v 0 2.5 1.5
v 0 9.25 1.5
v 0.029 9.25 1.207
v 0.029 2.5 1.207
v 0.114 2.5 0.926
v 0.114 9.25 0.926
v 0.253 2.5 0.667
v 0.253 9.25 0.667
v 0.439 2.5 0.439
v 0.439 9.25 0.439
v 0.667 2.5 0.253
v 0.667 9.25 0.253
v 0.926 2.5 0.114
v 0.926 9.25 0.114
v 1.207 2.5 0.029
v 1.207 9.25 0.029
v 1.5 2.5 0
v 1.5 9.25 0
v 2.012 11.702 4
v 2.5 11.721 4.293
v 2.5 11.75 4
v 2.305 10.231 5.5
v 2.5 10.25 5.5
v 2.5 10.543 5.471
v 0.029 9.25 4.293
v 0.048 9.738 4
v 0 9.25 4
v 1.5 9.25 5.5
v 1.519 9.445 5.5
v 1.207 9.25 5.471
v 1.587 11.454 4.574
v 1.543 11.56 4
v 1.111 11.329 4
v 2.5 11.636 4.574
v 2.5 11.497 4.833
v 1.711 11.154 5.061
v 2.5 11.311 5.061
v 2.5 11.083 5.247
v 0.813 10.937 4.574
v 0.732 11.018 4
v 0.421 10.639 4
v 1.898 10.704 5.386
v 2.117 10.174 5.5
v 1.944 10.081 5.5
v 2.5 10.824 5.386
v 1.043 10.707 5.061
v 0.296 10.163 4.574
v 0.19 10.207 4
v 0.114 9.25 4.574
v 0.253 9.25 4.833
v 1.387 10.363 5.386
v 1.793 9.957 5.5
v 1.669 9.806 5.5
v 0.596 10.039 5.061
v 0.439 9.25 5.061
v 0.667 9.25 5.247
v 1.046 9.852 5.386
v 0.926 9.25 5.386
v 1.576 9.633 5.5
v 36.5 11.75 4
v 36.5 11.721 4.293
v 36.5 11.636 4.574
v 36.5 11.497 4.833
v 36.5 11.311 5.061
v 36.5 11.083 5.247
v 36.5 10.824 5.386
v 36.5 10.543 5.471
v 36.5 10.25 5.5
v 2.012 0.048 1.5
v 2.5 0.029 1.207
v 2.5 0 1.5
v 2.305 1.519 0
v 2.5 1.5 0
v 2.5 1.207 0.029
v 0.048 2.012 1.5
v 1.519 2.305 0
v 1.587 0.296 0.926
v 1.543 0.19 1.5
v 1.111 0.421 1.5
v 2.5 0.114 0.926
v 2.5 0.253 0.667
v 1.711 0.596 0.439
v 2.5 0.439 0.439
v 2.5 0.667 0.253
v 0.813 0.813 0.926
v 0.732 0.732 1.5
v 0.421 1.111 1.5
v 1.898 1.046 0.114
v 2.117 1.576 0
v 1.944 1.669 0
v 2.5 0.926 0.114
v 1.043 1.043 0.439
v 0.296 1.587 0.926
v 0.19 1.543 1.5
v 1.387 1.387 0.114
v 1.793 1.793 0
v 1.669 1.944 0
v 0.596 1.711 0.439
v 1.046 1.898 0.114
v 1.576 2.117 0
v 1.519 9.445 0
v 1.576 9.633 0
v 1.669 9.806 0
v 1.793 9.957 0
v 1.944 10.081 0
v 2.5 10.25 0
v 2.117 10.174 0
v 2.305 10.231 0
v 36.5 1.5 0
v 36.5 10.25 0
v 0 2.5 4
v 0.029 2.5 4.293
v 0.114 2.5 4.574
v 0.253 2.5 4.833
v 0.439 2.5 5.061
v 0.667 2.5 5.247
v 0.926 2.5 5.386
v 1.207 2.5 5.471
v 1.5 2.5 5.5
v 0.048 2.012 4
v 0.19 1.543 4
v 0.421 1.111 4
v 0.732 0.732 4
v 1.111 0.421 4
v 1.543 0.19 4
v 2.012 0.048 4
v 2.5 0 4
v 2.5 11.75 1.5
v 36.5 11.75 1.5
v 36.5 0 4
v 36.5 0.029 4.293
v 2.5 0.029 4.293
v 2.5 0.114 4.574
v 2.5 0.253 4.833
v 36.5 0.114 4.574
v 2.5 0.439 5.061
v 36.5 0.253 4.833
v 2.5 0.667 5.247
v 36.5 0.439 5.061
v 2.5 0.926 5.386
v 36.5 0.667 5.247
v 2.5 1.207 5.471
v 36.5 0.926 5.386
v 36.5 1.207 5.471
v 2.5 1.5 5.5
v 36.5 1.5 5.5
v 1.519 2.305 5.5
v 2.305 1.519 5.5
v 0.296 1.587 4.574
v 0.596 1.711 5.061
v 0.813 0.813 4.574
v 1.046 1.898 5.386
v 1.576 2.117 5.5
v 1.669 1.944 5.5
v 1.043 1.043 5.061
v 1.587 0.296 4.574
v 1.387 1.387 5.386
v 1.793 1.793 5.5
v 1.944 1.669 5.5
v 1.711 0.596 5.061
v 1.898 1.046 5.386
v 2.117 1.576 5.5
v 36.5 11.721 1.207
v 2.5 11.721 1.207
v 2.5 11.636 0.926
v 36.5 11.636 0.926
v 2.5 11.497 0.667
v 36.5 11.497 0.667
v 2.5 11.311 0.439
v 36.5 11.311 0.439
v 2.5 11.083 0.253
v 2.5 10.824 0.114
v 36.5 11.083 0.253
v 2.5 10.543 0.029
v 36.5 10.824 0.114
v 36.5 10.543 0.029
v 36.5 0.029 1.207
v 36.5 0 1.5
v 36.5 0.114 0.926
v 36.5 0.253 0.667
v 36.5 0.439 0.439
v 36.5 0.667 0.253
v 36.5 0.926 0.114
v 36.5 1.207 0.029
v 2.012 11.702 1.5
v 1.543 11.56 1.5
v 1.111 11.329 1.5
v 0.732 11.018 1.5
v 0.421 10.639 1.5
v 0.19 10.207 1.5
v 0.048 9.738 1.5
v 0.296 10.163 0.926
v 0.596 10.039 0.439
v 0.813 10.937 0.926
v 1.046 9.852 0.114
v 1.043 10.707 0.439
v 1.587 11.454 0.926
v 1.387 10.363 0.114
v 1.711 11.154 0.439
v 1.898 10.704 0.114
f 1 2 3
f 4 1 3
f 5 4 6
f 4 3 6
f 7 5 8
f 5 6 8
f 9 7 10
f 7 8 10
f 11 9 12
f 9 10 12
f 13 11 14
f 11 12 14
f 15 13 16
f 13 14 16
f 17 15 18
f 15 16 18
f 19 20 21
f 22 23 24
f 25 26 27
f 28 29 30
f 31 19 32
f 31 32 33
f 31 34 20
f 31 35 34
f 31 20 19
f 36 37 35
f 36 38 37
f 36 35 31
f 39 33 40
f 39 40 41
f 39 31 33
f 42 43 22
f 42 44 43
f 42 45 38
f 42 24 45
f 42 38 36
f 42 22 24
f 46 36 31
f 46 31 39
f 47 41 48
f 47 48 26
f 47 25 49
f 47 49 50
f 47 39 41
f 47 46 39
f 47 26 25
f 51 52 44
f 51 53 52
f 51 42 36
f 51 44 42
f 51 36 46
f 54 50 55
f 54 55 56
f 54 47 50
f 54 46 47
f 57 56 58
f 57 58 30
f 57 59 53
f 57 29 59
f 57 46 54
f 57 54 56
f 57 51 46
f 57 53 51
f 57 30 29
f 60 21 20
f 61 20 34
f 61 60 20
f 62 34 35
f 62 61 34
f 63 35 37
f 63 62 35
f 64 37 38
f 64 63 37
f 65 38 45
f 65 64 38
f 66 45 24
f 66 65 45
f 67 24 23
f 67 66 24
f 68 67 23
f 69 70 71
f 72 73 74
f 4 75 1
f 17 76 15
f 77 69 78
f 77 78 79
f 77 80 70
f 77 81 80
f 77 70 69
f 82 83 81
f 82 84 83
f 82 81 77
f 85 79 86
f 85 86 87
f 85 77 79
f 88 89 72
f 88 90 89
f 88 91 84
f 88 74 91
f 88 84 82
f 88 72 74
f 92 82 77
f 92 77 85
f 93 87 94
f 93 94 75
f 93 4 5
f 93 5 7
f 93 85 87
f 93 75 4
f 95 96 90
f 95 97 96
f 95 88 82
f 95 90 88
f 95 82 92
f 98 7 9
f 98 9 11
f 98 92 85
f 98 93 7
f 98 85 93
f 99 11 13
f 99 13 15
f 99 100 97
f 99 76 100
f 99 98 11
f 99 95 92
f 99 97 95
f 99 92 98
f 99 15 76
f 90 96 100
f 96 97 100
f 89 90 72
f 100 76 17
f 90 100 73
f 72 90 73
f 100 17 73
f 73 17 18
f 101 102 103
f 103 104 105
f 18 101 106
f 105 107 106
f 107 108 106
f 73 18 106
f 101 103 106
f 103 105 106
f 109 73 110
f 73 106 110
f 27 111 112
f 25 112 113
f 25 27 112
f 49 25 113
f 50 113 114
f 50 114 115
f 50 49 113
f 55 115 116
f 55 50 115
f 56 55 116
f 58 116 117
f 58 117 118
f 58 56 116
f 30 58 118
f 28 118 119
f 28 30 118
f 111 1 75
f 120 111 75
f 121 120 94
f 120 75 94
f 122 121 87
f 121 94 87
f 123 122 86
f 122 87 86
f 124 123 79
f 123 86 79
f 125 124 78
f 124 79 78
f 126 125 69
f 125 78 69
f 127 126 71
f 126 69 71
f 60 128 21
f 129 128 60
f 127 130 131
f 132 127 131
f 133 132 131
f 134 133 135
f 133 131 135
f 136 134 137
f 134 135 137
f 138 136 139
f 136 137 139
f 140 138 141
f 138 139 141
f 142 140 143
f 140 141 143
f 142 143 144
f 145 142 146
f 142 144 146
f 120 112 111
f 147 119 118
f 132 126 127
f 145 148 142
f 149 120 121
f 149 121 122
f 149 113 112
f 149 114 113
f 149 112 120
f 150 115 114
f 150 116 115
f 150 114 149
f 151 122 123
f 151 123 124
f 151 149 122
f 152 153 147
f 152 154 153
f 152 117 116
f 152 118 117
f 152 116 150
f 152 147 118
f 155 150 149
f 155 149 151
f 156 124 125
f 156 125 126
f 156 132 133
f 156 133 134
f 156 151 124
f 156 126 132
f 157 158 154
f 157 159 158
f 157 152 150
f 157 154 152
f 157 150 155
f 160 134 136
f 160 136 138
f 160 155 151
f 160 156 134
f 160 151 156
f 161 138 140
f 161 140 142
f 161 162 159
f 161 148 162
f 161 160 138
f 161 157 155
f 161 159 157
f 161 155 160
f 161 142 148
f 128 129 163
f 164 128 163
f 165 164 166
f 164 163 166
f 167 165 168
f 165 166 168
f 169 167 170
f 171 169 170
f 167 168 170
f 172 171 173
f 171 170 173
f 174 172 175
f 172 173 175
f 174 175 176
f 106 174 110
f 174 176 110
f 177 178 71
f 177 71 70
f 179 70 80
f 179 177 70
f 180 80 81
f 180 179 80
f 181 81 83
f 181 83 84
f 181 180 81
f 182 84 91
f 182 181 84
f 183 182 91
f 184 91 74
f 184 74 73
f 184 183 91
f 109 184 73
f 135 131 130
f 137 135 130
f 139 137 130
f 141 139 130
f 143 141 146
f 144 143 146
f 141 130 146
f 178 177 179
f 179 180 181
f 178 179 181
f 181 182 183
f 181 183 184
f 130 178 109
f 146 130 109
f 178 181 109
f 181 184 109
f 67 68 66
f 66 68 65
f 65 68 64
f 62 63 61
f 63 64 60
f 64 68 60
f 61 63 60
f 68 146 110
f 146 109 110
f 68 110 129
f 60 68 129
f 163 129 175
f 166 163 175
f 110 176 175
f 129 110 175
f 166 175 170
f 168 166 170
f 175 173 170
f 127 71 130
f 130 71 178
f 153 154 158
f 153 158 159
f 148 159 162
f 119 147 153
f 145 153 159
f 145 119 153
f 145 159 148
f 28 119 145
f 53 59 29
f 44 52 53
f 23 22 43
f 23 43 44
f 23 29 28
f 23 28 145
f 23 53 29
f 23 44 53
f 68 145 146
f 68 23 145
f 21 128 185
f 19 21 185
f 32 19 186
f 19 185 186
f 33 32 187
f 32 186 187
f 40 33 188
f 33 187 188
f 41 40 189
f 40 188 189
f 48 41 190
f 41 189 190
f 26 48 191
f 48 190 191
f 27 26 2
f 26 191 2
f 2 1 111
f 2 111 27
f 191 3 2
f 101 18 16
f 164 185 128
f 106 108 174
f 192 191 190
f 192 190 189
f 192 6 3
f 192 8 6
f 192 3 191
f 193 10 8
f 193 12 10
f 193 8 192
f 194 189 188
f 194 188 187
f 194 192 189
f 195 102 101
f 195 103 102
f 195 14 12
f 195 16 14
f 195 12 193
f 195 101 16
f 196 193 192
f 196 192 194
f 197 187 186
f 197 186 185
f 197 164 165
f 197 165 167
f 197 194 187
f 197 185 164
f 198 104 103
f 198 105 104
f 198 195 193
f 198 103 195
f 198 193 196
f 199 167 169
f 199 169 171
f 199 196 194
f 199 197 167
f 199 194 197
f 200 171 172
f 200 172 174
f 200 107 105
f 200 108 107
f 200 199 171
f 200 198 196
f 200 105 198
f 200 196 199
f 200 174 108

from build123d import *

# Parameters (mm, degrees)
SKETCH1_W           = 36.5
SKETCH1_H           = 11.75
BOSS_EXTRUDE1_DEPTH = 5.5
BODY_FILLET_R       = 1.5
FILLET1_R           = 2.5


with BuildPart() as part:
    # Sketch1 → Boss-Extrude1 (new body)
    with BuildSketch(Plane.XY):
        with Locations((18.25, 5.875)):
            Rectangle(SKETCH1_W, SKETCH1_H)
    extrude(amount=BOSS_EXTRUDE1_DEPTH)

    # Body Fillet
    body_fillet_edges = [part.edges().sort_by_distance(p)[0] for p in [
        (18.25, 11.75, 5.5),
        (0, 5.875, 5.5),
        (18.25, 11.75, 0),
        (18.25, 0, 0),
        (0, 5.875, 0),
        (18.25, 0, 5.5),
    ]]
    fillet(body_fillet_edges, radius=BODY_FILLET_R)

    # Fillet1
    # the kernel refuses this fillet: 2.5 mm, written as the material it takes off along each edge
    with BuildSketch(Plane(origin=(2.5, 9.25, 0), x_dir=(-1, 0, 0), z_dir=(0, -1, 0))) as fillet1_piece_1:
        with BuildLine():
            CenterArc((1, -1.5), 1.5, 0, 90)
            Line((2.5, -1.5), (2.5, 0))
            Line((2.5, 0), (1, 0))
        make_face()
    revolve(axis=Axis((2.5, 9.25, 0), (0, 0, -1)), revolution_arc=90, mode=Mode.SUBTRACT)
    with BuildSketch(Plane(origin=(2.5, 2.5, 0), x_dir=(0, -1, 0), z_dir=(1, 0, 0))) as fillet1_piece_2:
        with BuildLine():
            CenterArc((1, -1.5), 1.5, 0, 90)
            Line((2.5, -1.5), (2.5, 0))
            Line((2.5, 0), (1, 0))
        make_face()
    revolve(axis=Axis((2.5, 2.5, 0), (0, 0, -1)), revolution_arc=90, mode=Mode.SUBTRACT)
    with BuildSketch(Plane(origin=(2.5, 9.25, 5.5), x_dir=(0, 1, 0), z_dir=(1, 0, 0))) as fillet1_piece_3:
        with BuildLine():
            CenterArc((1, -1.5), 1.5, 0, 90)
            Line((2.5, -1.5), (2.5, 0))
            Line((2.5, 0), (1, 0))
        make_face()
    revolve(axis=Axis((2.5, 9.25, 5.5), (0, 0, 1)), revolution_arc=90, mode=Mode.SUBTRACT)
    with BuildSketch(Plane(origin=(2.5, 2.5, 5.5), x_dir=(-1, 0, 0), z_dir=(0, 1, 0))) as fillet1_piece_4:
        with BuildLine():
            CenterArc((1, -1.5), 1.5, 0, 90)
            Line((2.5, -1.5), (2.5, 0))
            Line((2.5, 0), (1, 0))
        make_face()
    revolve(axis=Axis((2.5, 2.5, 5.5), (0, 0, 1)), revolution_arc=90, mode=Mode.SUBTRACT)
    with BuildSketch(Plane(origin=(0, 0, 0), x_dir=(1, 0, 0), z_dir=(0, 0, 1)), Plane(origin=(0, 11.75, 0), x_dir=(0, -1, 0), z_dir=(0, 0, 1))) as fillet1_piece_5:
        with BuildLine():
            CenterArc((FILLET1_R, FILLET1_R), FILLET1_R, 180, 90)
            Line((0, FILLET1_R), (0, 0))
            Line((0, 0), (FILLET1_R, 0))
        make_face()
    extrude(amount=5.5, mode=Mode.SUBTRACT)


solid = part.part
